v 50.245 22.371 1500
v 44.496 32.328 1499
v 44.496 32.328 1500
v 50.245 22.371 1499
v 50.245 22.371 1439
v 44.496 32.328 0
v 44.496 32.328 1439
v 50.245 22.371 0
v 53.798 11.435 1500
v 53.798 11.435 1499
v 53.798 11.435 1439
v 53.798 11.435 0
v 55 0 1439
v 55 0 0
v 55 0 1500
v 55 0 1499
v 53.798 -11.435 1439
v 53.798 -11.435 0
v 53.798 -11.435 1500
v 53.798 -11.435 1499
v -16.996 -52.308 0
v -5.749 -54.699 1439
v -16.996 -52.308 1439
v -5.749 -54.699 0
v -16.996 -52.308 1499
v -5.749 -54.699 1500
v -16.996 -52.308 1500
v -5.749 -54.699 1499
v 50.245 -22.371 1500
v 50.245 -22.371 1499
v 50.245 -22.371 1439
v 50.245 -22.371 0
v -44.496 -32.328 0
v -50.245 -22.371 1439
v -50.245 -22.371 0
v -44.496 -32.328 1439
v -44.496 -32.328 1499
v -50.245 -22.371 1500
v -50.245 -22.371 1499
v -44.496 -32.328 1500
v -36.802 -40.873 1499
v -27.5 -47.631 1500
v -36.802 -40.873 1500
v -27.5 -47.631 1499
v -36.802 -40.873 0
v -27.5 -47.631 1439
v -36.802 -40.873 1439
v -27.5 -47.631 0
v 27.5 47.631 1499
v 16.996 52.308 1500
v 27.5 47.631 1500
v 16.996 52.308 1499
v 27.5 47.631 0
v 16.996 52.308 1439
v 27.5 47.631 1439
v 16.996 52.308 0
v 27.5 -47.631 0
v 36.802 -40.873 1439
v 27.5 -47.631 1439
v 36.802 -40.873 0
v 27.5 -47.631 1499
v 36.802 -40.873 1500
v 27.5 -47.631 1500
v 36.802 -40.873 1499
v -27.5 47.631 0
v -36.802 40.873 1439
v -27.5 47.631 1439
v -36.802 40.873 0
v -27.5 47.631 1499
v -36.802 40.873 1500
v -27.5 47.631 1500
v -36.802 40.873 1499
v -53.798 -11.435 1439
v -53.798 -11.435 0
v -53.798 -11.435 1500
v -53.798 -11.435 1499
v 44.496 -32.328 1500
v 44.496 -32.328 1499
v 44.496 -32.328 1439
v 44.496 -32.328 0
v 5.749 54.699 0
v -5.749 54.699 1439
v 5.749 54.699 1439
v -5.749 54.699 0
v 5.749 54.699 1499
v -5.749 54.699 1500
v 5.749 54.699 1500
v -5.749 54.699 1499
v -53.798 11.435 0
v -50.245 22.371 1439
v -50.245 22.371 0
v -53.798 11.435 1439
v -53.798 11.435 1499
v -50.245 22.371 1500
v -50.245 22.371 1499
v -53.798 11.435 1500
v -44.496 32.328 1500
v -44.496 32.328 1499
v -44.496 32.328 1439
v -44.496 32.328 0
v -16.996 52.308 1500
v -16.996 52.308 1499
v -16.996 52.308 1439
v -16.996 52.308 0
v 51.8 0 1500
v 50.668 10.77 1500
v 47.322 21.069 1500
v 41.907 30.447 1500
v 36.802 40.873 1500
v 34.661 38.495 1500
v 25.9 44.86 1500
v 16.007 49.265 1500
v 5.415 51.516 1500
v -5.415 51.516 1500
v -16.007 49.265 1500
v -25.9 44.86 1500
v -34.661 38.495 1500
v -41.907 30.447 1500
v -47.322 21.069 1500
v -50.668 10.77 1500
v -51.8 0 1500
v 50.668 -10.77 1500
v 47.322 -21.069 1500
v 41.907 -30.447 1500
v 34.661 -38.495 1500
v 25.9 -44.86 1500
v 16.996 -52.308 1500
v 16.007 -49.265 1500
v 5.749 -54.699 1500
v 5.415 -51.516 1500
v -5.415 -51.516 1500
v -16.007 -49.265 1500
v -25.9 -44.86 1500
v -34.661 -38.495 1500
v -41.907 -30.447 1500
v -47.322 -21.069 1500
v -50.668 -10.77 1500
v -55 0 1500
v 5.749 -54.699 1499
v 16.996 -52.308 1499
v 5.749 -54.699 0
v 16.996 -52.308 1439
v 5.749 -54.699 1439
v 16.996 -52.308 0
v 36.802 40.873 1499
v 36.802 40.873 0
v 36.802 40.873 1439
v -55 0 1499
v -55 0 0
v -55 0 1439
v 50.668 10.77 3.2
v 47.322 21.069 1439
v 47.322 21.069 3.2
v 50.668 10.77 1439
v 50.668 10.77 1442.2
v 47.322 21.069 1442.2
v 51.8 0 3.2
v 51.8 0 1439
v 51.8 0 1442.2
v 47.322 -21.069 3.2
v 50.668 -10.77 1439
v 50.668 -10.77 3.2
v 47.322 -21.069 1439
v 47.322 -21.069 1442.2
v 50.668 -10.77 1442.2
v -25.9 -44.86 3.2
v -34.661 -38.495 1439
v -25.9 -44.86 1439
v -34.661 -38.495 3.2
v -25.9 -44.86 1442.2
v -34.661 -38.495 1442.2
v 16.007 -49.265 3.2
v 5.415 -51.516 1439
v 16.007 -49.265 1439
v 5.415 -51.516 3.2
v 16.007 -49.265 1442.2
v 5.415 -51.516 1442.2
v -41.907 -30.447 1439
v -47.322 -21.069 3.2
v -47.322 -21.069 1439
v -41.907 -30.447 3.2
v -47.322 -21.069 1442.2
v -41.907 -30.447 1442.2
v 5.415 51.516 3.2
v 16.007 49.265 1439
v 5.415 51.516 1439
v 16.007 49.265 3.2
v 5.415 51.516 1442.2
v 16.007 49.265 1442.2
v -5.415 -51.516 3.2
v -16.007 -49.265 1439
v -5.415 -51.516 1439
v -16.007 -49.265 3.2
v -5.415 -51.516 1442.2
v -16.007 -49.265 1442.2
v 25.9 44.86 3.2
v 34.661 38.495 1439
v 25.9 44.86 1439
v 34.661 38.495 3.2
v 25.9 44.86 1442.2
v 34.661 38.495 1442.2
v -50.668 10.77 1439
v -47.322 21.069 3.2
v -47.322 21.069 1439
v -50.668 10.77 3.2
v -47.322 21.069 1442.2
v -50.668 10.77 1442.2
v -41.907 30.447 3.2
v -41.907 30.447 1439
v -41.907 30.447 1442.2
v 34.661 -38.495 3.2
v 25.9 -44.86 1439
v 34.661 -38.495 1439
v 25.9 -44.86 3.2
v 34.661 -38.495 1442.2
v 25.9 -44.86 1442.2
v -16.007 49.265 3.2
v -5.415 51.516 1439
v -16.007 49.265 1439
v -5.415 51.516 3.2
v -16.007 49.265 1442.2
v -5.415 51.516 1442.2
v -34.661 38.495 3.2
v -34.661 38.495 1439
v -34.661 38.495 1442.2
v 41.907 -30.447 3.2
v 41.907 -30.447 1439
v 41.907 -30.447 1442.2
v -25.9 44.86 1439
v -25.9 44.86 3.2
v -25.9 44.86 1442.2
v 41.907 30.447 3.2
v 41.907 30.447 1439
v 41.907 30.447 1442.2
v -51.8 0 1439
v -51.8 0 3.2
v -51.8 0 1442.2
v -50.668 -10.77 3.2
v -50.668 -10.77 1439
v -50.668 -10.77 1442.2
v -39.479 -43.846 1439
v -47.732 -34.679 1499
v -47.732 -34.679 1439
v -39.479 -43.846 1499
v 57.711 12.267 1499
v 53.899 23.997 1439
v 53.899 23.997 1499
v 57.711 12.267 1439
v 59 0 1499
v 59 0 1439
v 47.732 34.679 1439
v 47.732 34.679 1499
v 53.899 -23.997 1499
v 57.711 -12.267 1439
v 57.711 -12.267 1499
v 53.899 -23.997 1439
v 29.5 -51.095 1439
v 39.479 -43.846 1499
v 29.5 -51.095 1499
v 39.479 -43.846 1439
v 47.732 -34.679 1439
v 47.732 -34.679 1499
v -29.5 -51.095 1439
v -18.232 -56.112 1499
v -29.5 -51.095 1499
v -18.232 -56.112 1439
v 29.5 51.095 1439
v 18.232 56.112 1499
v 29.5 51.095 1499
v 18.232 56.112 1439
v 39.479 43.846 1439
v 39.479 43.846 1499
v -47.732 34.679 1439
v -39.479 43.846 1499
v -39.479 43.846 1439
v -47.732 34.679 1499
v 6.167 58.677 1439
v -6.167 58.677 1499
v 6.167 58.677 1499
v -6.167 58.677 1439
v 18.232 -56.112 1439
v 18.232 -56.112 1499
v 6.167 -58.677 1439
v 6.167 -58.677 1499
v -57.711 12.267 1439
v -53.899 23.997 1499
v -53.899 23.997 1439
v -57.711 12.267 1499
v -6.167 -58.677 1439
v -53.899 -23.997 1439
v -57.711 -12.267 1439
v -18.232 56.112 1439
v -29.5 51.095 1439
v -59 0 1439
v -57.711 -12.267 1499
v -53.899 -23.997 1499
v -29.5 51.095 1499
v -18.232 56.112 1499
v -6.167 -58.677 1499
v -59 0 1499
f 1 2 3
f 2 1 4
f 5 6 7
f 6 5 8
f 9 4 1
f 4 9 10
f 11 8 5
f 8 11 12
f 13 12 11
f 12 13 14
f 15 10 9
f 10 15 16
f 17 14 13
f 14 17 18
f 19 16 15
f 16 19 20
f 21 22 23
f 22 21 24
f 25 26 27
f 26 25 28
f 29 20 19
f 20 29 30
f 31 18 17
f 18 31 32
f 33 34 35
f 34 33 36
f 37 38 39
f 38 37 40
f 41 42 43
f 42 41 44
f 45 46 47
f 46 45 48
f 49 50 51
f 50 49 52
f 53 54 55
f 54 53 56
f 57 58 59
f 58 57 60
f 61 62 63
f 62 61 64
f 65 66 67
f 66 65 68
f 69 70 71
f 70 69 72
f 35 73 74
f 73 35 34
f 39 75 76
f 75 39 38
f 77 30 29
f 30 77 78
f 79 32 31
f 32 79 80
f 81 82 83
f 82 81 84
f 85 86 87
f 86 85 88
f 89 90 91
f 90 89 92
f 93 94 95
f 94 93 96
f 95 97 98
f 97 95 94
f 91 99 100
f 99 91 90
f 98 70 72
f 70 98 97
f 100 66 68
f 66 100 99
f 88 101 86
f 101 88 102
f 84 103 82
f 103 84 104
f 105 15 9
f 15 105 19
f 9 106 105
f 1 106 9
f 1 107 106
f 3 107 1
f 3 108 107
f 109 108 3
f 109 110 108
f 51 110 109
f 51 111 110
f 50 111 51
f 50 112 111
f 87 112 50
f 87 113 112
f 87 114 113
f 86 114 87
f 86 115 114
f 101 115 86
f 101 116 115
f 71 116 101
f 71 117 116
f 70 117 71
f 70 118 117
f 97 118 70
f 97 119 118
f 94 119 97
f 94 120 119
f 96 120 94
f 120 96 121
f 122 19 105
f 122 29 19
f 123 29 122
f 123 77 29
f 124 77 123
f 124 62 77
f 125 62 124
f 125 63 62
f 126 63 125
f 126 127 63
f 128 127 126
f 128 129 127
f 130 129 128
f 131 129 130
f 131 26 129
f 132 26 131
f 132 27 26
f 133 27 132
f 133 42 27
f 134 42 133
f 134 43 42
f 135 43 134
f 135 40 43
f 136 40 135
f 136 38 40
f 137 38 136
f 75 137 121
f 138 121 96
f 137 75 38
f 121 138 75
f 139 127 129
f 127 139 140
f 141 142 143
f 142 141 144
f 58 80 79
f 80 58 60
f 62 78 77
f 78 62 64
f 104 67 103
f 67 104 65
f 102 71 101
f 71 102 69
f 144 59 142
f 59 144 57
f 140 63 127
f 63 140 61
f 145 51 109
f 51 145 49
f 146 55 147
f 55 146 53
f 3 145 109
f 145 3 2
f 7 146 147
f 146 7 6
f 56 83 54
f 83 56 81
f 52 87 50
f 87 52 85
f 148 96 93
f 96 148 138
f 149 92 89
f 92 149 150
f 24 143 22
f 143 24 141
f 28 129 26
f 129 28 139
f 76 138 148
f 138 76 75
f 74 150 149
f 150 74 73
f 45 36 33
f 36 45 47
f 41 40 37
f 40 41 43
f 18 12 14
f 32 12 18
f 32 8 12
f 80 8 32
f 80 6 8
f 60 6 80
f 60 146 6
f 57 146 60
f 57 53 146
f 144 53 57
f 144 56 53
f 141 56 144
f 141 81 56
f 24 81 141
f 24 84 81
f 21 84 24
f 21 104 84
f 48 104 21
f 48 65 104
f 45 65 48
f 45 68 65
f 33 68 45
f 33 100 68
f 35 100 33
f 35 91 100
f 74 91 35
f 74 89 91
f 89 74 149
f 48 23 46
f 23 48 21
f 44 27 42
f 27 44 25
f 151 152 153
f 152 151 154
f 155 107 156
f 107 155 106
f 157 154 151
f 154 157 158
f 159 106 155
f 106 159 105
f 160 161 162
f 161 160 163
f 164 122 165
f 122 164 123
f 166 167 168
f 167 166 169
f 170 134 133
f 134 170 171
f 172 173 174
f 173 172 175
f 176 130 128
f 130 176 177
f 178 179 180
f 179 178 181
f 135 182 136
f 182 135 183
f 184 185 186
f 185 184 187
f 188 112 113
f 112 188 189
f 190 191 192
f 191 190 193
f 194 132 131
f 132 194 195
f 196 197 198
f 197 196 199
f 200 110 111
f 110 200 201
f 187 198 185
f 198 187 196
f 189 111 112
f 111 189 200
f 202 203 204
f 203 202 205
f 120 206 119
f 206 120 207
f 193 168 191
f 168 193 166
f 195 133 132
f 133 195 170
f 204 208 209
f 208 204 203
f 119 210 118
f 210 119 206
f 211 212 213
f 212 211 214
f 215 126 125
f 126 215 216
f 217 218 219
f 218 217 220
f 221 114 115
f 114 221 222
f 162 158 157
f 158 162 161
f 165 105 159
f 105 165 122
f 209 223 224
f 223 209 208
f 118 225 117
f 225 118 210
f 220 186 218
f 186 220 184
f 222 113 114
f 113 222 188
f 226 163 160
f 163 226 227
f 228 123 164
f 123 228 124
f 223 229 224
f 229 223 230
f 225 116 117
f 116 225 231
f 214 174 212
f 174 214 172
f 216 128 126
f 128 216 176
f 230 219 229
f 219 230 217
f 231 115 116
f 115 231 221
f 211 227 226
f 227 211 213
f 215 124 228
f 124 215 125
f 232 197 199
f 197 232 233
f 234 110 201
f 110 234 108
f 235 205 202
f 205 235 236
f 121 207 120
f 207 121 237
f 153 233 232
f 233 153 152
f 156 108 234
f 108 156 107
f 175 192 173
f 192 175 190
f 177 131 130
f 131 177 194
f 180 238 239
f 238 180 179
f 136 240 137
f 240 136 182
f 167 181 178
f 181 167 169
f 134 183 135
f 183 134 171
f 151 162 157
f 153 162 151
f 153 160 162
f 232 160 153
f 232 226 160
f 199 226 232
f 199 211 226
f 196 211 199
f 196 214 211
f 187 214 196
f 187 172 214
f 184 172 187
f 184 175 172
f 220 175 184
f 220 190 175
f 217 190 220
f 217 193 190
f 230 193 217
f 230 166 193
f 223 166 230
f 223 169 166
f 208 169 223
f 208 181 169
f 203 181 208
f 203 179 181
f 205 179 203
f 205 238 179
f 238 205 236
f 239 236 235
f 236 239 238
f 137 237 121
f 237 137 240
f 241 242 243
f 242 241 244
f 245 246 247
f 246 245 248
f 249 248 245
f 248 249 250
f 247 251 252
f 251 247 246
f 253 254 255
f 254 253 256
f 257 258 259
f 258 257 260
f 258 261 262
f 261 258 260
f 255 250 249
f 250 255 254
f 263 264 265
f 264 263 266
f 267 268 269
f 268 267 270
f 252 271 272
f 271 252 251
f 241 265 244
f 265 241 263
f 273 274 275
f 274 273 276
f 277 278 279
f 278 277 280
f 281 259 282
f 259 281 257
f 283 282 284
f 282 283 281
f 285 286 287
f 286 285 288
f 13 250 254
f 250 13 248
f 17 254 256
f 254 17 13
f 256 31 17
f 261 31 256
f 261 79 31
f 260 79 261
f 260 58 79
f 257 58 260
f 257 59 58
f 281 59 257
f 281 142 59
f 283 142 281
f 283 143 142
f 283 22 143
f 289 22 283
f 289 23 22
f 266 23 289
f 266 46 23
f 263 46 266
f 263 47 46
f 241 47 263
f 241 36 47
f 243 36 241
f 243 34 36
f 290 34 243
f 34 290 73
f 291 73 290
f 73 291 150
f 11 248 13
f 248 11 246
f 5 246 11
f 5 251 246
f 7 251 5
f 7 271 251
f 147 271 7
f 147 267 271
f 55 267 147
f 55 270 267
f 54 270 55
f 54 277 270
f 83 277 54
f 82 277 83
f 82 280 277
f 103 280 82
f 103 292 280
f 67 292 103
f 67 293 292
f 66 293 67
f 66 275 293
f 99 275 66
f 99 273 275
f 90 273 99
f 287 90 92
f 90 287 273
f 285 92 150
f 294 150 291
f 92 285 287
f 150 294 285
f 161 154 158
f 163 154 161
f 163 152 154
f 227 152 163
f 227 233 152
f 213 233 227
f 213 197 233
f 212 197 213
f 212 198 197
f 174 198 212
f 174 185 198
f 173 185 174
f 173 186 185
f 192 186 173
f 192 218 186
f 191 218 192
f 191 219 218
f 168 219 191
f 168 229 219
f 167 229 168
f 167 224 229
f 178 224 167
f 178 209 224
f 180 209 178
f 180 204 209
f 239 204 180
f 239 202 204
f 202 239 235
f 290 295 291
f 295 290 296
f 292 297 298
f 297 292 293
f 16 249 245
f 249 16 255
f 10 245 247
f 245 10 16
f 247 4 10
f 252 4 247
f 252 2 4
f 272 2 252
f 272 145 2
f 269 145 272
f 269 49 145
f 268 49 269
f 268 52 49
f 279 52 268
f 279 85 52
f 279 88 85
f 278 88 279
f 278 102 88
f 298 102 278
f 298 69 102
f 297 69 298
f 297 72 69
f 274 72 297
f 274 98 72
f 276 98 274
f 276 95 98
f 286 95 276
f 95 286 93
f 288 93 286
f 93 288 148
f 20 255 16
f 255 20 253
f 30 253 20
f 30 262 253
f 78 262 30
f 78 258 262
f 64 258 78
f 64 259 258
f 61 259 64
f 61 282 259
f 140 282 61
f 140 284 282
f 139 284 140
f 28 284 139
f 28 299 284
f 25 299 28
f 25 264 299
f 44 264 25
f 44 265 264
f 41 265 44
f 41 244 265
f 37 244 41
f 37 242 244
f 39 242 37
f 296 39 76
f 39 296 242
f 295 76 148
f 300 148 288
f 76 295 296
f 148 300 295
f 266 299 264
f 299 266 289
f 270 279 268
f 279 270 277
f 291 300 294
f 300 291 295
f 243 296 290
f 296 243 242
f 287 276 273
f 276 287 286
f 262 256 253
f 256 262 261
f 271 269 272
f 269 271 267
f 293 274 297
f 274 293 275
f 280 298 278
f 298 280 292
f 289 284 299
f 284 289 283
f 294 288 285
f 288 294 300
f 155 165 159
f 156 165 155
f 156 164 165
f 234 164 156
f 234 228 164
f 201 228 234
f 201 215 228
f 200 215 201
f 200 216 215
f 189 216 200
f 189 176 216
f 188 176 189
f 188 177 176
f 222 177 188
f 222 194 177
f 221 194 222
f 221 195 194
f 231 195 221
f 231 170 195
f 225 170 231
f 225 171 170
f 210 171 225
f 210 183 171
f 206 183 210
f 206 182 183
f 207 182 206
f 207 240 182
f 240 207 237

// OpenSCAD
// Parameters
nominal_diameter_mm = 110; //[55:220:1]
length_mm = 1500; //[750:3000:10]
wall_thickness_mm = 3.2; //[1.6:6.4:0.1]
end_fitting_length_mm = 60; //[30:120:1]
end_fitting_radial_add_mm = 4; //[2:10:0.5]
connection_overlap_mm = 1; //[0.5:2:0.1]

// HT Pipe - complete geometry
module ht_pipe() {
  color([0.85, 0.85, 0.8]) { // PVC color
    // Pipe body
    difference() {
      cylinder(h=length_mm, r=nominal_diameter_mm/2, center=false);
      translate([0, 0, wall_thickness_mm])
        cylinder(h=length_mm, r=nominal_diameter_mm/2 - wall_thickness_mm, center=false);
    }
    
    // End fitting detail
    translate([0, 0, length_mm - end_fitting_length_mm - connection_overlap_mm]) {
      difference() {
        cylinder(h=end_fitting_length_mm, r=nominal_diameter_mm/2 + end_fitting_radial_add_mm, center=false);
        translate([0, 0, wall_thickness_mm])
          cylinder(h=end_fitting_length_mm + connection_overlap_mm, r=nominal_diameter_mm/2 - wall_thickness_mm, center=false);
      }
    }
  }
}

// Assembly
module assembly() {
  ht_pipe();
}

assembly();
